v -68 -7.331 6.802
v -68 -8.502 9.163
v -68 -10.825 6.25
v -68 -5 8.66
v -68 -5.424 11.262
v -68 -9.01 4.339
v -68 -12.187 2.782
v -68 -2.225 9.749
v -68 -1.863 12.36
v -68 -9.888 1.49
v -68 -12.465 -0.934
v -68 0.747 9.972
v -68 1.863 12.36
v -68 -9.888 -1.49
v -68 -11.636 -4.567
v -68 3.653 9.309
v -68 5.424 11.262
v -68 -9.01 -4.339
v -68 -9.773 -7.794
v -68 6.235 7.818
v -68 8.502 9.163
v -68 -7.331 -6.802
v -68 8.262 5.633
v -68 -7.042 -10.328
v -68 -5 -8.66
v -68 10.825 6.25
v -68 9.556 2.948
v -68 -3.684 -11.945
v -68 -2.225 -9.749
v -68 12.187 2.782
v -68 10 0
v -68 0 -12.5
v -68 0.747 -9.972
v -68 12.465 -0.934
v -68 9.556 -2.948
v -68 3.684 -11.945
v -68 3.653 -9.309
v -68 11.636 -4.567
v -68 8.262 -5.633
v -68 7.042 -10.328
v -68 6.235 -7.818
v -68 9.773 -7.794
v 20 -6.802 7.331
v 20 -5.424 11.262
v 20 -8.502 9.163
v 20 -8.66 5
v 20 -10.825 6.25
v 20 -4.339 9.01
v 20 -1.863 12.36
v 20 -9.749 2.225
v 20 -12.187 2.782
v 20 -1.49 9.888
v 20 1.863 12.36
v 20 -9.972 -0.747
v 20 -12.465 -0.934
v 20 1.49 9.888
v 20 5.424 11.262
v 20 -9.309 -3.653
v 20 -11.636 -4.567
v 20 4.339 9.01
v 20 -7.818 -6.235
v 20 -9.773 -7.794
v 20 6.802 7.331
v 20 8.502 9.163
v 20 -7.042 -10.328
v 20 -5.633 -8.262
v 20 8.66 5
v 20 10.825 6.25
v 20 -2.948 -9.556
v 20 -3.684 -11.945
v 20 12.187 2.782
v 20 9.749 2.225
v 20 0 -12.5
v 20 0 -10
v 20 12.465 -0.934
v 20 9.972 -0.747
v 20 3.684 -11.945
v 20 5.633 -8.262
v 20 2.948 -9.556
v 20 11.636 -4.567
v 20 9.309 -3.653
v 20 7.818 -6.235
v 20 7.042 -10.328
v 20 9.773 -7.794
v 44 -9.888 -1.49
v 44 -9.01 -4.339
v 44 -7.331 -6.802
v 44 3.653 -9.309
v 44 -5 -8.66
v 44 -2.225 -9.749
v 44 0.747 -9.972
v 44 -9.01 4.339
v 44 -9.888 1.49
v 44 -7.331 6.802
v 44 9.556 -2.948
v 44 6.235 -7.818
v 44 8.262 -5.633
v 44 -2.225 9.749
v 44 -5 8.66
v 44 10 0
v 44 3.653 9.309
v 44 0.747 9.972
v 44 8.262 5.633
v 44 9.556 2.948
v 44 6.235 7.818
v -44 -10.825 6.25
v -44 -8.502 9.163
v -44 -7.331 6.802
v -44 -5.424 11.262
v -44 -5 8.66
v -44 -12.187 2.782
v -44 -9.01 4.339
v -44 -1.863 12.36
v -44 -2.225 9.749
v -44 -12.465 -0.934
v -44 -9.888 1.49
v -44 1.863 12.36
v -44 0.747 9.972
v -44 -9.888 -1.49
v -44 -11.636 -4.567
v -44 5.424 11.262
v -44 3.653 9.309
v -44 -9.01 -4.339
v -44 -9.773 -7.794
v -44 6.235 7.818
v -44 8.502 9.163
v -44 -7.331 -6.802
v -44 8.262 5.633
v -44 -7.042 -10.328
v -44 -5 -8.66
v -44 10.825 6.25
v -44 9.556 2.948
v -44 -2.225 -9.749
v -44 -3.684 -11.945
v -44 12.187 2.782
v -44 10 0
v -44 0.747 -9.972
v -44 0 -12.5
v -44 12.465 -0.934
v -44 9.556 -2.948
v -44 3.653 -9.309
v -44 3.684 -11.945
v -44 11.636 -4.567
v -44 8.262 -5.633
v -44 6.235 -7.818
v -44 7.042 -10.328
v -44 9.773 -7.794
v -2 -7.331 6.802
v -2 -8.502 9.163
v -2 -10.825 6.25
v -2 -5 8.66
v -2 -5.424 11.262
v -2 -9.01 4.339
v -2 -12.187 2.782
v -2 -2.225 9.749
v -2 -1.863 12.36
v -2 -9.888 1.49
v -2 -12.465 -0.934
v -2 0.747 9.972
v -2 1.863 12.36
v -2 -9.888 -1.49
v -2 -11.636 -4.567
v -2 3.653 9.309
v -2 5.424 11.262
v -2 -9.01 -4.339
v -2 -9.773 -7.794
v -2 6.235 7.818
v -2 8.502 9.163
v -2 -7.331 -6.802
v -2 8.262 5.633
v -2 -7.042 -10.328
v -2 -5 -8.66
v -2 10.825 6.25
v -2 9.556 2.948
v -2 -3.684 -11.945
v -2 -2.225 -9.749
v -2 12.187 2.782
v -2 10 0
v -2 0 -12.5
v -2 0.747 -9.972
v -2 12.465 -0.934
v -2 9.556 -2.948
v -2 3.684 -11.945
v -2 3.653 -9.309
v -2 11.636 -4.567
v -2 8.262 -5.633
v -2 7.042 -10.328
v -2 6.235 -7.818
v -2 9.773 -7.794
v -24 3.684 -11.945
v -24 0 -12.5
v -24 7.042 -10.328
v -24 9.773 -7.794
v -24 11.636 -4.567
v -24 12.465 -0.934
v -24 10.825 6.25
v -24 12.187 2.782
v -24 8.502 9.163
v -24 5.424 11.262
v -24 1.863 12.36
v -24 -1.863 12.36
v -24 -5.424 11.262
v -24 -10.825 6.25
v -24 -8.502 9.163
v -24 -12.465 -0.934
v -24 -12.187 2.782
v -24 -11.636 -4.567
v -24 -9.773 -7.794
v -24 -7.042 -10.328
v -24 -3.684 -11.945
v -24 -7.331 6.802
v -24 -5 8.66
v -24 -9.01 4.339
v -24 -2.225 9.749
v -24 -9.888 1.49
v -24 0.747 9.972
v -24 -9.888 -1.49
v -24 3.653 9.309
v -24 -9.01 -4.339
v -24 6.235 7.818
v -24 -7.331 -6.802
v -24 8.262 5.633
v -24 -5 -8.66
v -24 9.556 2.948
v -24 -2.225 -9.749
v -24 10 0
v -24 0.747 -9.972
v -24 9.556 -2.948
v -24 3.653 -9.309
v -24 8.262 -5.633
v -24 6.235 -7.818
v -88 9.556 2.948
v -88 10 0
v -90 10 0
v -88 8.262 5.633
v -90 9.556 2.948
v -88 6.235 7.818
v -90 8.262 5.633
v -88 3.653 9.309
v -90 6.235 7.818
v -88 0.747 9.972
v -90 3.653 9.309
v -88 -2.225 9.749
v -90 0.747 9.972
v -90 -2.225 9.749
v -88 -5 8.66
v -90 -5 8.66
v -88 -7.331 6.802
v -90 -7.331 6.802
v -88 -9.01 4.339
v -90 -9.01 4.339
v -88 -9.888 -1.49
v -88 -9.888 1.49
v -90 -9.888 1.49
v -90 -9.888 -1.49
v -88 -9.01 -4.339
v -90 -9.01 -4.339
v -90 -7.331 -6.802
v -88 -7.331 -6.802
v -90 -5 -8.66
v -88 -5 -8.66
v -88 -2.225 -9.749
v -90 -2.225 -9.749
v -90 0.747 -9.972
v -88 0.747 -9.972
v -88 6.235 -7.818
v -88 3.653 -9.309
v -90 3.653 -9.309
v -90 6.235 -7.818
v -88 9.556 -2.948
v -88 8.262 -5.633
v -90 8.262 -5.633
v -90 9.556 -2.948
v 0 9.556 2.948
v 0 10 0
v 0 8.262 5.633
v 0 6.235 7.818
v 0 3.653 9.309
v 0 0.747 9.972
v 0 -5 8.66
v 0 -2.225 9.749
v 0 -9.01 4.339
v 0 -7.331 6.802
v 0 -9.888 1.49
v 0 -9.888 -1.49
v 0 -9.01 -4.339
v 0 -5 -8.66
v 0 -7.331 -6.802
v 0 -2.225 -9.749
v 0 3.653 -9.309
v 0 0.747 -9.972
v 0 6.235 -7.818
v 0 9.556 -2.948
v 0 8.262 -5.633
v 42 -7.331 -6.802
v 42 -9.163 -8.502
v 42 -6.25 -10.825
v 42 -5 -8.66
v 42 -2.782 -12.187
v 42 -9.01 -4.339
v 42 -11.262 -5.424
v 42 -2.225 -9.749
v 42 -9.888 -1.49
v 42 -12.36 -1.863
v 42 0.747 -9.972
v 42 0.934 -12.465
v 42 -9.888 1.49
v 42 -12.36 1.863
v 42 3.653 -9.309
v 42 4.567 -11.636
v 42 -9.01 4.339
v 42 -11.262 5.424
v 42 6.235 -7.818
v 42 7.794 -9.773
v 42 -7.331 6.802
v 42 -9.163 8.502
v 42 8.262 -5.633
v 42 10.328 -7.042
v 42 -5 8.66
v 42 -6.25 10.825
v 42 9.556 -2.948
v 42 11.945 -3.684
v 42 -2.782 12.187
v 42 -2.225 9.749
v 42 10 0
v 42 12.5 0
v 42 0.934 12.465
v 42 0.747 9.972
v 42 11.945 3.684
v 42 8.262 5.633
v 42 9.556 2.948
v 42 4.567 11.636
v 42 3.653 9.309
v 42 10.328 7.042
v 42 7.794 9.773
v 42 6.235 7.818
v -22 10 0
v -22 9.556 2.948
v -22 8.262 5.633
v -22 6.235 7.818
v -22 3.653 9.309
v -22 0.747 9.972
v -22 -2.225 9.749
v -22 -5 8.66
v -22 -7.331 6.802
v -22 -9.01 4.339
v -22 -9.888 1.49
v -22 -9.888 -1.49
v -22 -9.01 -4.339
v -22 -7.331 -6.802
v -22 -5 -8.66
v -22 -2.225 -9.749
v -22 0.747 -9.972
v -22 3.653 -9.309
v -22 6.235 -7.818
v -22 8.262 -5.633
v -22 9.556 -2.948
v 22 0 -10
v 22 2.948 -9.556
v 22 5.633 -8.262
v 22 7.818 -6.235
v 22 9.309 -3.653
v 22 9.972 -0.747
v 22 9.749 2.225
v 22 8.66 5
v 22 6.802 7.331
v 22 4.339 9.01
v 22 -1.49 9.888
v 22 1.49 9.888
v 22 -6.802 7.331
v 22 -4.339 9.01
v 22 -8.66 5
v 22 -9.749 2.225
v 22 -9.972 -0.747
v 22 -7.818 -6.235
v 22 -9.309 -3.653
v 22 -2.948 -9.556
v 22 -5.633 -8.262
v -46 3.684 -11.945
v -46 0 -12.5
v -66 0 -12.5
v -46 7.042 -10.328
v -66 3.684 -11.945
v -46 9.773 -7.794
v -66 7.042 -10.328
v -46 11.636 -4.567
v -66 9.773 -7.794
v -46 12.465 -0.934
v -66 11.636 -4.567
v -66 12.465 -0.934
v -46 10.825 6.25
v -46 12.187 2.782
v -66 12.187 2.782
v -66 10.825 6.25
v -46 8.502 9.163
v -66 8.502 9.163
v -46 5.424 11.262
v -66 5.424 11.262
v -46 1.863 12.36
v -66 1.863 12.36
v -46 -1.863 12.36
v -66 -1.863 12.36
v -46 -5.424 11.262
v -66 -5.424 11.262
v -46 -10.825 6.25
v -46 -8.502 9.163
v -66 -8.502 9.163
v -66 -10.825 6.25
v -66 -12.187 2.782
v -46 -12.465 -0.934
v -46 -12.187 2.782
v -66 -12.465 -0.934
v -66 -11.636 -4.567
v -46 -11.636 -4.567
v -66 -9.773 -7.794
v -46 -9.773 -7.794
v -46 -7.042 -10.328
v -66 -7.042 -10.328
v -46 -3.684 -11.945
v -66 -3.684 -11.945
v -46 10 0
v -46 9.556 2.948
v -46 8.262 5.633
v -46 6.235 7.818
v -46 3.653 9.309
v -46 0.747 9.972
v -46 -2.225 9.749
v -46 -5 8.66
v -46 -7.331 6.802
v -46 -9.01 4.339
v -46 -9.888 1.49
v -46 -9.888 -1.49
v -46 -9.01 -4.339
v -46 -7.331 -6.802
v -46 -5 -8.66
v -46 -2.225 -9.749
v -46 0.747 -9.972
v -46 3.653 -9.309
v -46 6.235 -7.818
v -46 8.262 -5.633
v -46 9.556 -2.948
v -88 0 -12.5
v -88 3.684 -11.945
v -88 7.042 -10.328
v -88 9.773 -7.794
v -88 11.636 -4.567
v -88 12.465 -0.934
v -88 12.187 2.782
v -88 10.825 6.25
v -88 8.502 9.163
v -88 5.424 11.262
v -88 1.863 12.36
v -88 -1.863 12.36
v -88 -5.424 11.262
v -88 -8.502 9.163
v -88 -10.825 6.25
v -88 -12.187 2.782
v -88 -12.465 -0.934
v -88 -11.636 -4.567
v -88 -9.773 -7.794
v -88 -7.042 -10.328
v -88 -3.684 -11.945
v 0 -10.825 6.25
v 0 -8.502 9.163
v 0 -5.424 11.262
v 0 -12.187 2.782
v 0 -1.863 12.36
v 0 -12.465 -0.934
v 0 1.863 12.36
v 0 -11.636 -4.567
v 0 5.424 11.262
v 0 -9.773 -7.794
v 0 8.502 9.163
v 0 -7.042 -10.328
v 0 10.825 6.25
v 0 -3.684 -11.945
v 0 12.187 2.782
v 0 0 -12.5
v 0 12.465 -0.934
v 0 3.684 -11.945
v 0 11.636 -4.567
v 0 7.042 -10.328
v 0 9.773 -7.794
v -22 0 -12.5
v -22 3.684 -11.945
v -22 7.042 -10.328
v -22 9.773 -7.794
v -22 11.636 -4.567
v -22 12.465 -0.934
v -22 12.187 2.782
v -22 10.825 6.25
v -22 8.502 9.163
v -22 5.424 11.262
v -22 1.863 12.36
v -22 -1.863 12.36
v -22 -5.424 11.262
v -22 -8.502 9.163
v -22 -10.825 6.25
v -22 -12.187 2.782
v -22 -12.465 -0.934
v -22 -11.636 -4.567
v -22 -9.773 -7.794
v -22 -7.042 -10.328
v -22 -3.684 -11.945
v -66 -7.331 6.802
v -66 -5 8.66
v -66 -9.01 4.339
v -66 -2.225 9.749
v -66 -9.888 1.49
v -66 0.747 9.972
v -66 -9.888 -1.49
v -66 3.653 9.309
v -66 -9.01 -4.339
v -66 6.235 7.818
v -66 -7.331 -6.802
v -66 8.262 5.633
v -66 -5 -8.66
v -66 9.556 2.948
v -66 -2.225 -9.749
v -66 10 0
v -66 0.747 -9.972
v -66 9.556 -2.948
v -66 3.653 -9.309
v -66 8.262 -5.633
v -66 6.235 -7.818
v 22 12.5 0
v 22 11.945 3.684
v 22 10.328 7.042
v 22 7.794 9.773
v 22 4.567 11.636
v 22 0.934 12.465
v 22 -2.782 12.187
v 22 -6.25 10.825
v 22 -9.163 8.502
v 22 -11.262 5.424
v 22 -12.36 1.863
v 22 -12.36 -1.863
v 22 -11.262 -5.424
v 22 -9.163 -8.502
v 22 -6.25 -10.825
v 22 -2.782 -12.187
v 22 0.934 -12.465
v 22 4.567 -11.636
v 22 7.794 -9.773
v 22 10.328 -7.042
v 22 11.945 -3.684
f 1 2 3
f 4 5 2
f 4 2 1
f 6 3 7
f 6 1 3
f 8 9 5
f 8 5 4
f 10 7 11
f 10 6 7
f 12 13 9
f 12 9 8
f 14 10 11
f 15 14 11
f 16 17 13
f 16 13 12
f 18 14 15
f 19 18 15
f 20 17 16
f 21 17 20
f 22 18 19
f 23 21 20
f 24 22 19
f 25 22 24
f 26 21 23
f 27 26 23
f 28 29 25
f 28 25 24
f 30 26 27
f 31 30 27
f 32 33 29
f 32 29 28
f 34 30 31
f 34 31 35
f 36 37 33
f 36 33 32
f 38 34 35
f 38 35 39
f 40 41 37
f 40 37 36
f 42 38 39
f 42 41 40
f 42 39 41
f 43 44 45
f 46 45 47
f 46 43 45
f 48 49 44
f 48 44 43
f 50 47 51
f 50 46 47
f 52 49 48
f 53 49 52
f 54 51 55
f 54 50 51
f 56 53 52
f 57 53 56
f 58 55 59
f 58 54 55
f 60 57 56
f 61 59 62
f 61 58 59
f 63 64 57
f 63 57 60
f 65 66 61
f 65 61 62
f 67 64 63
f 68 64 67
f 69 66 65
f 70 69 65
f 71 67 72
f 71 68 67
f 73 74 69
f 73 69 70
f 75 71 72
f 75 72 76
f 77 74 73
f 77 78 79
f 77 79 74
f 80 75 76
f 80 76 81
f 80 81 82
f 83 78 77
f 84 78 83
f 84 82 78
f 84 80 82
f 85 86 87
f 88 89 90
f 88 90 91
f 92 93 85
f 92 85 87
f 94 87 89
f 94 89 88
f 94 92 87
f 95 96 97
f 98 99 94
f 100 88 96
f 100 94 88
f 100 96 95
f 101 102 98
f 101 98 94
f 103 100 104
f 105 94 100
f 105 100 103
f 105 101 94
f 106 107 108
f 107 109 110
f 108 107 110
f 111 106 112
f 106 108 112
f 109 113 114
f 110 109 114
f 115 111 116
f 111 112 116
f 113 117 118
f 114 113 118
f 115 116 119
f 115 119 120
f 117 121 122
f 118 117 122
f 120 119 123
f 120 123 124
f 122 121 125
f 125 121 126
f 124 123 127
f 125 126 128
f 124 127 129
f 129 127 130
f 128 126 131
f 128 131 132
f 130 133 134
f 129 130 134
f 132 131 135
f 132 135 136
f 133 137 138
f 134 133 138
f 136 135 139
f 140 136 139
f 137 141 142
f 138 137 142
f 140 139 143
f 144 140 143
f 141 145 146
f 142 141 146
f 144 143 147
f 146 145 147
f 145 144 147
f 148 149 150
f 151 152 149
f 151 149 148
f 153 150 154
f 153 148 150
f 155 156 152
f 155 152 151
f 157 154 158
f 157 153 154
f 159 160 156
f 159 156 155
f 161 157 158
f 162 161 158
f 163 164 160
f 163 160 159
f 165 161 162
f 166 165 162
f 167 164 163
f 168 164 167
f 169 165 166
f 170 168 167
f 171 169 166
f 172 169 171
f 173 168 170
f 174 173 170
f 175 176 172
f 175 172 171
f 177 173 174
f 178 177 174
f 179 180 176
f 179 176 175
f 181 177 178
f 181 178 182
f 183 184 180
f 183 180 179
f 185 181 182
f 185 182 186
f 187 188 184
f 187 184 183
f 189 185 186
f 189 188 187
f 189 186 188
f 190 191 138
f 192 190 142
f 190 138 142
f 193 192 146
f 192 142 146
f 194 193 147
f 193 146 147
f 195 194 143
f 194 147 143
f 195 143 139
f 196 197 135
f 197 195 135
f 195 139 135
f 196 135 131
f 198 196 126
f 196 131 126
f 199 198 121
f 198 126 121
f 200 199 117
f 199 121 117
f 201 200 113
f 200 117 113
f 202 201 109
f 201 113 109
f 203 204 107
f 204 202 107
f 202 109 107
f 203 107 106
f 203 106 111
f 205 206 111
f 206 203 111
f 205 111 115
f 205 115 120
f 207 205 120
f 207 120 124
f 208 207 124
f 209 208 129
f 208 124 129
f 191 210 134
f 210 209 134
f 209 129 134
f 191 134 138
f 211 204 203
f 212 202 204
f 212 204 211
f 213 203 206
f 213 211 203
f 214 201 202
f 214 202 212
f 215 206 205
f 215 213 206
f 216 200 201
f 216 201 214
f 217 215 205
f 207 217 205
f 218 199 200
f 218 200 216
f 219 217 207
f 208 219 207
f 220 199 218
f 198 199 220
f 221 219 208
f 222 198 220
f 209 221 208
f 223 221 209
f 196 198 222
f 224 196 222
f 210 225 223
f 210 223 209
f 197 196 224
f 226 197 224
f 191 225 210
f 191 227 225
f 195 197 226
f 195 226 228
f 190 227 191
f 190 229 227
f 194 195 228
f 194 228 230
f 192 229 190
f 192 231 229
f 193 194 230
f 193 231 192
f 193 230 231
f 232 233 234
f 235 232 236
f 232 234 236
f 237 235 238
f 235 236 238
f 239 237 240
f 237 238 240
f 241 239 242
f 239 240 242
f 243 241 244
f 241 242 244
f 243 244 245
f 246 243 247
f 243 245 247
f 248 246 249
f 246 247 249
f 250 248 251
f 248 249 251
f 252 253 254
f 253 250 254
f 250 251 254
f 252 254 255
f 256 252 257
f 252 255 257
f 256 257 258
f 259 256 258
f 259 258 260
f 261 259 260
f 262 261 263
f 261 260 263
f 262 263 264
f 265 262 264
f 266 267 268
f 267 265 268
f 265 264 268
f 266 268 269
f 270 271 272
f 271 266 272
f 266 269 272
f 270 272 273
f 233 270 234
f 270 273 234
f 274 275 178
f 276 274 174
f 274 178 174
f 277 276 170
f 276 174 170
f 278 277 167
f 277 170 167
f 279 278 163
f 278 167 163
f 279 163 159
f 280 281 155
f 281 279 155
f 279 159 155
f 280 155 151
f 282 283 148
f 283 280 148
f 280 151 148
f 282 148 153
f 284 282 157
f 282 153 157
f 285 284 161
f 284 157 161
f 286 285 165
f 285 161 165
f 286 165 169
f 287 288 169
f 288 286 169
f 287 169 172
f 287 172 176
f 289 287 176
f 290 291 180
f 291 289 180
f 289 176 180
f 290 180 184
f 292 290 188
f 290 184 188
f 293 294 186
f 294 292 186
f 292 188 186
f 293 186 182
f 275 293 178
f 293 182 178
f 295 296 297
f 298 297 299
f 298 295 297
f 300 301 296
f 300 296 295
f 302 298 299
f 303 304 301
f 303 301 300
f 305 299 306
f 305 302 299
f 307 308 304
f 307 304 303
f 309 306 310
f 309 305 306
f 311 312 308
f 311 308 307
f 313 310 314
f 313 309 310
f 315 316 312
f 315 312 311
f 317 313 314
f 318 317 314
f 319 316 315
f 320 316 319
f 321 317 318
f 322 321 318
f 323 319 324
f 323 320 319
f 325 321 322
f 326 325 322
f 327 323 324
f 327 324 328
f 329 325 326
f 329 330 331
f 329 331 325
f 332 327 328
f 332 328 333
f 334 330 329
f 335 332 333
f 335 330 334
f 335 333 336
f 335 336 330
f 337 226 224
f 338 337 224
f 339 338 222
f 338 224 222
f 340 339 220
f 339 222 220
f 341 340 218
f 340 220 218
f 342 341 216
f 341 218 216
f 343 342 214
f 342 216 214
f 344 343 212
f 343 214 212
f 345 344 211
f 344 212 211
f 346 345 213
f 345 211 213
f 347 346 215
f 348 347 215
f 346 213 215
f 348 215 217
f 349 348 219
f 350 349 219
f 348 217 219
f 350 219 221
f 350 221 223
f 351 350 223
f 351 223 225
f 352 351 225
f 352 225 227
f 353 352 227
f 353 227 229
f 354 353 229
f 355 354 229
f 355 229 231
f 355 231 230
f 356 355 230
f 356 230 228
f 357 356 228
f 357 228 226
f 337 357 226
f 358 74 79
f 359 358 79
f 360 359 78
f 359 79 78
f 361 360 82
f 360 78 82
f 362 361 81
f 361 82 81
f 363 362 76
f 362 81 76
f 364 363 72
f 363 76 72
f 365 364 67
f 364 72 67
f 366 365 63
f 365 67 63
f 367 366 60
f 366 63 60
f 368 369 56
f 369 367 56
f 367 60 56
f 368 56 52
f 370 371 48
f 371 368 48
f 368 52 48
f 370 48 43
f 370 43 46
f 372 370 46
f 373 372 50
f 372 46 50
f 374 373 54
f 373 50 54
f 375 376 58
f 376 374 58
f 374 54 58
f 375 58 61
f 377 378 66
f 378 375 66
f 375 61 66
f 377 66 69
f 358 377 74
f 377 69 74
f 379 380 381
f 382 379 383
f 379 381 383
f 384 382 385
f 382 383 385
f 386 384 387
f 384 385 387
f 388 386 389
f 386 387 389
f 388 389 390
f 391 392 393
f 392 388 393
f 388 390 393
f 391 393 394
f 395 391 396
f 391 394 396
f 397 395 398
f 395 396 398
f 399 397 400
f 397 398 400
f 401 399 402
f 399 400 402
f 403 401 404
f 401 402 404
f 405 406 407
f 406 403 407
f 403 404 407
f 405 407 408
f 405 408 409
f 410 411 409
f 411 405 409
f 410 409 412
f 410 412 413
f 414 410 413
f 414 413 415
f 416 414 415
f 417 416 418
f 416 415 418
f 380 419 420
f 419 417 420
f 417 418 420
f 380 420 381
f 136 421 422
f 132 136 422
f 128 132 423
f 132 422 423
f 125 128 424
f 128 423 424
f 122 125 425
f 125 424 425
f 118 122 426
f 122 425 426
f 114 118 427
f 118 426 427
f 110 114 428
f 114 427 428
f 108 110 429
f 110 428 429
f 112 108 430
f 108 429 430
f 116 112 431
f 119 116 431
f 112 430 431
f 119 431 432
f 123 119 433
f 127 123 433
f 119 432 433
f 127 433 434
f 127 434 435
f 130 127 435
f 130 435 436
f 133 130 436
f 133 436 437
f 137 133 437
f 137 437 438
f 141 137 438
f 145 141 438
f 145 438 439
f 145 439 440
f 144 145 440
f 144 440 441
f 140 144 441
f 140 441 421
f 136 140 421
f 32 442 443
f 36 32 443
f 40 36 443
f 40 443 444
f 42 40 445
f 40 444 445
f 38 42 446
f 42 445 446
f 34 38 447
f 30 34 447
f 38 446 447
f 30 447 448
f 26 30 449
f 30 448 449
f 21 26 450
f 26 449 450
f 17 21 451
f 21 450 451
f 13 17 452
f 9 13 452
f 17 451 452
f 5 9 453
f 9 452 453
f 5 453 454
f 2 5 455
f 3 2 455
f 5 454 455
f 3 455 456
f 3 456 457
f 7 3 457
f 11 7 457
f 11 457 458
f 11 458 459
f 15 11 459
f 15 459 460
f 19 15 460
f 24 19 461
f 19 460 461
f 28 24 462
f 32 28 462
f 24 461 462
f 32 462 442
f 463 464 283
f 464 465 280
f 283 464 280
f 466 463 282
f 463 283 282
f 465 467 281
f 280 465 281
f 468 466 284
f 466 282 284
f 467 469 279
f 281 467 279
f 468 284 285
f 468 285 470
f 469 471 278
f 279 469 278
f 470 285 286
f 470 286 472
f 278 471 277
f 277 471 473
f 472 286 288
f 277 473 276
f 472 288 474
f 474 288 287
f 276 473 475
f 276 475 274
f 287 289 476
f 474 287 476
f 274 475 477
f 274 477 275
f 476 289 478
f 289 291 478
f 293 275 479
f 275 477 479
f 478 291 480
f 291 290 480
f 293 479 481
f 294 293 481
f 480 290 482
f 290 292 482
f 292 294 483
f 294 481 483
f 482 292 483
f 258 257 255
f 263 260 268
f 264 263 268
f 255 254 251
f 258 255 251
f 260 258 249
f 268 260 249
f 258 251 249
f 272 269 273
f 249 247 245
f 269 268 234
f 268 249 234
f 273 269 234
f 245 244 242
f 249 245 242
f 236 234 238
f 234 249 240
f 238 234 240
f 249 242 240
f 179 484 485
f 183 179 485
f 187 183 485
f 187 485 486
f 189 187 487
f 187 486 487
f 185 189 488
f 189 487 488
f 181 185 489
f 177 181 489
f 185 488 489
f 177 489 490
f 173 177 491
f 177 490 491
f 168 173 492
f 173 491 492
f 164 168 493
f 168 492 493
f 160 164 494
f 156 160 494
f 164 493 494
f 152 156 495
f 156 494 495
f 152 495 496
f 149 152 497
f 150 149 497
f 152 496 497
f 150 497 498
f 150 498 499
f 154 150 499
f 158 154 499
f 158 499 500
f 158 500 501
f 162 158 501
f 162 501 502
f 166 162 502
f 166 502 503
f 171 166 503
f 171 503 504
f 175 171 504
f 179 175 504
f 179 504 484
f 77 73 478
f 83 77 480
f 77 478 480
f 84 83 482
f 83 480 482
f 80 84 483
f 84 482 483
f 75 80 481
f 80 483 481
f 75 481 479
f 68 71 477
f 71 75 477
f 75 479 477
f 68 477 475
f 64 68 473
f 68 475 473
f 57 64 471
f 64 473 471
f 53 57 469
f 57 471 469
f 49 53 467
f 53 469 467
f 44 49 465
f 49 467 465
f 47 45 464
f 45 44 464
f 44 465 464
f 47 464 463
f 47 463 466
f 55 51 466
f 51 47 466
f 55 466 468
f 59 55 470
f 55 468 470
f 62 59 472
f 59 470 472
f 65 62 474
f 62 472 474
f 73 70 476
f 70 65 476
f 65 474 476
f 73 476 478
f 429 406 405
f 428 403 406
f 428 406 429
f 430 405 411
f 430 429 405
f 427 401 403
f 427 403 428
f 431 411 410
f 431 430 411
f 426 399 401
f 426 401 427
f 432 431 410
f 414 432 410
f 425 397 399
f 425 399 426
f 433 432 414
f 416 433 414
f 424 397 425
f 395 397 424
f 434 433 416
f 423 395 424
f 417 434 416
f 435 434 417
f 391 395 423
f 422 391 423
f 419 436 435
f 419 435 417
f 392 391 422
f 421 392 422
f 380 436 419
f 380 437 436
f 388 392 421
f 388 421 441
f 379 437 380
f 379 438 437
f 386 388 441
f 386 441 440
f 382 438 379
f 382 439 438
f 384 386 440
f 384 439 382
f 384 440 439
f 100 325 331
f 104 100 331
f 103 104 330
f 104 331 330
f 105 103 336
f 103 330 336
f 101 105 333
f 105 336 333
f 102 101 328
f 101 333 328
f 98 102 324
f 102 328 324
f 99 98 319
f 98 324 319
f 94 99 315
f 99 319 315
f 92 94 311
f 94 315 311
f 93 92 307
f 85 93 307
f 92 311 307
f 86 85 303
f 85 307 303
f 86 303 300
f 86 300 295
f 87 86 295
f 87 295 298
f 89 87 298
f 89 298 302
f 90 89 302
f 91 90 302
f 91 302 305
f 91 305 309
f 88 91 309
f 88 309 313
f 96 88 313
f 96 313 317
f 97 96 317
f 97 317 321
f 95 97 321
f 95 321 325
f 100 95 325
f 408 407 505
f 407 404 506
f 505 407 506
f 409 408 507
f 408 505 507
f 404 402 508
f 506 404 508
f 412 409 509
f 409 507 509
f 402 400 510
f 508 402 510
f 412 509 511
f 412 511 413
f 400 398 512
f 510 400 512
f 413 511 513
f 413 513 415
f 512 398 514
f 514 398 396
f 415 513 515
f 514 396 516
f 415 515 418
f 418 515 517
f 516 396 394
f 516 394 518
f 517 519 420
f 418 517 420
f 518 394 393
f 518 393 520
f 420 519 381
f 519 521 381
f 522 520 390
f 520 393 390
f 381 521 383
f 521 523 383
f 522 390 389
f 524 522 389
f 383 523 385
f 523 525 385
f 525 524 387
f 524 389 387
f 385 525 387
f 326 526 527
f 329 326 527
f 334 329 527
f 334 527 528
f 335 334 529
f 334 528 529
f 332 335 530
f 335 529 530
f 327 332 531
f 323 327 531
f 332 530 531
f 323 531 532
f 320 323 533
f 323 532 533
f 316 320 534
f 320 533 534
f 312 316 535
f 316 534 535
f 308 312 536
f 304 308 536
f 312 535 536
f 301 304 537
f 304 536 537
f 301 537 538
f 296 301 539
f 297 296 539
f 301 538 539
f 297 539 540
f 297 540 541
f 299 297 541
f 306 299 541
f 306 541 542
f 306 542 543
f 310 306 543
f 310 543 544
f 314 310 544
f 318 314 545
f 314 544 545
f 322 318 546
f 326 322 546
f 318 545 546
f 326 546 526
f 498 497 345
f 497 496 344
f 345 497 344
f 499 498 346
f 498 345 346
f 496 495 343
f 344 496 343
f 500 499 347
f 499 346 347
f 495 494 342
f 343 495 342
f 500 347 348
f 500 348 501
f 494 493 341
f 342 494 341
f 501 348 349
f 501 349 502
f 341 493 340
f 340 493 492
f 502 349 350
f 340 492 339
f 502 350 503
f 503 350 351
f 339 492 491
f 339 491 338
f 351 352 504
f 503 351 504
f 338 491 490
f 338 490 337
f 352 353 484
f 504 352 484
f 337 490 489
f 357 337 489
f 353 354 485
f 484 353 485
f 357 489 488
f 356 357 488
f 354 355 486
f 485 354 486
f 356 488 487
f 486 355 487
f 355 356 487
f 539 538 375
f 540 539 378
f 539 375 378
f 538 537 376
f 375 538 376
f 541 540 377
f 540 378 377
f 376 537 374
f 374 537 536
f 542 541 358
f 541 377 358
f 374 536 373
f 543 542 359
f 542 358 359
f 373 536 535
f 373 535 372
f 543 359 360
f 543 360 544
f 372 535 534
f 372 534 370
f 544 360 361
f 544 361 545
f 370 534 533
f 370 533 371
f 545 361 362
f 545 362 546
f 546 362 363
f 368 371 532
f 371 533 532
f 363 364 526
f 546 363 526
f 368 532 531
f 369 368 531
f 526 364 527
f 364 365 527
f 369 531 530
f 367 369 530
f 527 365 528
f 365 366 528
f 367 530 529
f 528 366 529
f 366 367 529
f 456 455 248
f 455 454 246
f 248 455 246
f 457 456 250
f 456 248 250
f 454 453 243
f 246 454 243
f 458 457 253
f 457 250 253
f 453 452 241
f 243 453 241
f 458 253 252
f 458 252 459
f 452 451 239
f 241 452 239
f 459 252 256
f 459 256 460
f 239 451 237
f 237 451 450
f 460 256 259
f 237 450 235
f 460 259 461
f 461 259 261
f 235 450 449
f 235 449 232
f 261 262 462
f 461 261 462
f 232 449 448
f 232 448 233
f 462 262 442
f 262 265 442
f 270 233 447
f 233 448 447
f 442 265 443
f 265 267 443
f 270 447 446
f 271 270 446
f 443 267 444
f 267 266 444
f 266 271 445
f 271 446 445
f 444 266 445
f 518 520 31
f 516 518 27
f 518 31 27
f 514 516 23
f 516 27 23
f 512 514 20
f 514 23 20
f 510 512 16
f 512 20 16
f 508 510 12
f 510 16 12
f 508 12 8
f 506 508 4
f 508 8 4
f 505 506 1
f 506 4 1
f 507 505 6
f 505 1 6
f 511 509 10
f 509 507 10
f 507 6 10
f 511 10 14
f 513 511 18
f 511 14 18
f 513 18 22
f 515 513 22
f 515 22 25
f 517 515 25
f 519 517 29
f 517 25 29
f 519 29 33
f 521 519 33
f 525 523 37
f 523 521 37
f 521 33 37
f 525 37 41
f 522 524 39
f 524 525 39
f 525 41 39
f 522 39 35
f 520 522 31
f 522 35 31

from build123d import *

# Parameters (mm, degrees)
SKETCH1_R             = 12.5
BOSS_EXTRUDE1_DEPTH   = 20
SKETCH2_R             = 10
BOSS_EXTRUDE2_DEPTH   = 2
LPATTERN4_START       = 22
LPATTERN4_OUTLINE_R   = 12.5
LPATTERN4_DEPTH       = 20
LPATTERN4_START_2     = -2
LPATTERN4_2_OUTLINE_R = 10
LPATTERN4_2_DEPTH     = 46
LPATTERN5_COUNT       = 5
LPATTERN5_PITCH       = 22


# Read off the part's stored shape, not the designer's step: LPattern4
with BuildPart() as part:
    # Sketch1 → Boss-Extrude1 (new body)
    with BuildSketch(Plane(origin=(0, 0, 0), x_dir=(0, 0, -1), z_dir=(1, 0, 0))):
        Circle(SKETCH1_R)
    boss_extrude1 = extrude(amount=BOSS_EXTRUDE1_DEPTH)

    # Sketch2 → Boss-Extrude2 (add)
    with BuildSketch(Plane(origin=(20, 0, 0), x_dir=(0, 0, -1), z_dir=(1, 0, 0))):
        Circle(SKETCH2_R)
    extrude(amount=BOSS_EXTRUDE2_DEPTH)

    # LPattern4 outline → LPattern4 (add)
    with BuildSketch(Plane.YZ.offset(LPATTERN4_START)):
        Circle(LPATTERN4_OUTLINE_R)
    lpattern4 = extrude(amount=LPATTERN4_DEPTH)

    # LPattern4 2 outline → LPattern4 2 (add)
    with BuildSketch(Plane.YZ.offset(LPATTERN4_START_2)):
        Circle(LPATTERN4_2_OUTLINE_R)
    lpattern4_2 = extrude(amount=LPATTERN4_2_DEPTH)

    # LPattern5: Boss-Extrude1, LPattern4, LPattern4 2 ×5
    with Locations(*[(-i * LPATTERN5_PITCH, 0, 0) for i in range(1, LPATTERN5_COUNT)]):
        add(boss_extrude1)
        add(lpattern4)
        add(lpattern4_2)


solid = part.part
